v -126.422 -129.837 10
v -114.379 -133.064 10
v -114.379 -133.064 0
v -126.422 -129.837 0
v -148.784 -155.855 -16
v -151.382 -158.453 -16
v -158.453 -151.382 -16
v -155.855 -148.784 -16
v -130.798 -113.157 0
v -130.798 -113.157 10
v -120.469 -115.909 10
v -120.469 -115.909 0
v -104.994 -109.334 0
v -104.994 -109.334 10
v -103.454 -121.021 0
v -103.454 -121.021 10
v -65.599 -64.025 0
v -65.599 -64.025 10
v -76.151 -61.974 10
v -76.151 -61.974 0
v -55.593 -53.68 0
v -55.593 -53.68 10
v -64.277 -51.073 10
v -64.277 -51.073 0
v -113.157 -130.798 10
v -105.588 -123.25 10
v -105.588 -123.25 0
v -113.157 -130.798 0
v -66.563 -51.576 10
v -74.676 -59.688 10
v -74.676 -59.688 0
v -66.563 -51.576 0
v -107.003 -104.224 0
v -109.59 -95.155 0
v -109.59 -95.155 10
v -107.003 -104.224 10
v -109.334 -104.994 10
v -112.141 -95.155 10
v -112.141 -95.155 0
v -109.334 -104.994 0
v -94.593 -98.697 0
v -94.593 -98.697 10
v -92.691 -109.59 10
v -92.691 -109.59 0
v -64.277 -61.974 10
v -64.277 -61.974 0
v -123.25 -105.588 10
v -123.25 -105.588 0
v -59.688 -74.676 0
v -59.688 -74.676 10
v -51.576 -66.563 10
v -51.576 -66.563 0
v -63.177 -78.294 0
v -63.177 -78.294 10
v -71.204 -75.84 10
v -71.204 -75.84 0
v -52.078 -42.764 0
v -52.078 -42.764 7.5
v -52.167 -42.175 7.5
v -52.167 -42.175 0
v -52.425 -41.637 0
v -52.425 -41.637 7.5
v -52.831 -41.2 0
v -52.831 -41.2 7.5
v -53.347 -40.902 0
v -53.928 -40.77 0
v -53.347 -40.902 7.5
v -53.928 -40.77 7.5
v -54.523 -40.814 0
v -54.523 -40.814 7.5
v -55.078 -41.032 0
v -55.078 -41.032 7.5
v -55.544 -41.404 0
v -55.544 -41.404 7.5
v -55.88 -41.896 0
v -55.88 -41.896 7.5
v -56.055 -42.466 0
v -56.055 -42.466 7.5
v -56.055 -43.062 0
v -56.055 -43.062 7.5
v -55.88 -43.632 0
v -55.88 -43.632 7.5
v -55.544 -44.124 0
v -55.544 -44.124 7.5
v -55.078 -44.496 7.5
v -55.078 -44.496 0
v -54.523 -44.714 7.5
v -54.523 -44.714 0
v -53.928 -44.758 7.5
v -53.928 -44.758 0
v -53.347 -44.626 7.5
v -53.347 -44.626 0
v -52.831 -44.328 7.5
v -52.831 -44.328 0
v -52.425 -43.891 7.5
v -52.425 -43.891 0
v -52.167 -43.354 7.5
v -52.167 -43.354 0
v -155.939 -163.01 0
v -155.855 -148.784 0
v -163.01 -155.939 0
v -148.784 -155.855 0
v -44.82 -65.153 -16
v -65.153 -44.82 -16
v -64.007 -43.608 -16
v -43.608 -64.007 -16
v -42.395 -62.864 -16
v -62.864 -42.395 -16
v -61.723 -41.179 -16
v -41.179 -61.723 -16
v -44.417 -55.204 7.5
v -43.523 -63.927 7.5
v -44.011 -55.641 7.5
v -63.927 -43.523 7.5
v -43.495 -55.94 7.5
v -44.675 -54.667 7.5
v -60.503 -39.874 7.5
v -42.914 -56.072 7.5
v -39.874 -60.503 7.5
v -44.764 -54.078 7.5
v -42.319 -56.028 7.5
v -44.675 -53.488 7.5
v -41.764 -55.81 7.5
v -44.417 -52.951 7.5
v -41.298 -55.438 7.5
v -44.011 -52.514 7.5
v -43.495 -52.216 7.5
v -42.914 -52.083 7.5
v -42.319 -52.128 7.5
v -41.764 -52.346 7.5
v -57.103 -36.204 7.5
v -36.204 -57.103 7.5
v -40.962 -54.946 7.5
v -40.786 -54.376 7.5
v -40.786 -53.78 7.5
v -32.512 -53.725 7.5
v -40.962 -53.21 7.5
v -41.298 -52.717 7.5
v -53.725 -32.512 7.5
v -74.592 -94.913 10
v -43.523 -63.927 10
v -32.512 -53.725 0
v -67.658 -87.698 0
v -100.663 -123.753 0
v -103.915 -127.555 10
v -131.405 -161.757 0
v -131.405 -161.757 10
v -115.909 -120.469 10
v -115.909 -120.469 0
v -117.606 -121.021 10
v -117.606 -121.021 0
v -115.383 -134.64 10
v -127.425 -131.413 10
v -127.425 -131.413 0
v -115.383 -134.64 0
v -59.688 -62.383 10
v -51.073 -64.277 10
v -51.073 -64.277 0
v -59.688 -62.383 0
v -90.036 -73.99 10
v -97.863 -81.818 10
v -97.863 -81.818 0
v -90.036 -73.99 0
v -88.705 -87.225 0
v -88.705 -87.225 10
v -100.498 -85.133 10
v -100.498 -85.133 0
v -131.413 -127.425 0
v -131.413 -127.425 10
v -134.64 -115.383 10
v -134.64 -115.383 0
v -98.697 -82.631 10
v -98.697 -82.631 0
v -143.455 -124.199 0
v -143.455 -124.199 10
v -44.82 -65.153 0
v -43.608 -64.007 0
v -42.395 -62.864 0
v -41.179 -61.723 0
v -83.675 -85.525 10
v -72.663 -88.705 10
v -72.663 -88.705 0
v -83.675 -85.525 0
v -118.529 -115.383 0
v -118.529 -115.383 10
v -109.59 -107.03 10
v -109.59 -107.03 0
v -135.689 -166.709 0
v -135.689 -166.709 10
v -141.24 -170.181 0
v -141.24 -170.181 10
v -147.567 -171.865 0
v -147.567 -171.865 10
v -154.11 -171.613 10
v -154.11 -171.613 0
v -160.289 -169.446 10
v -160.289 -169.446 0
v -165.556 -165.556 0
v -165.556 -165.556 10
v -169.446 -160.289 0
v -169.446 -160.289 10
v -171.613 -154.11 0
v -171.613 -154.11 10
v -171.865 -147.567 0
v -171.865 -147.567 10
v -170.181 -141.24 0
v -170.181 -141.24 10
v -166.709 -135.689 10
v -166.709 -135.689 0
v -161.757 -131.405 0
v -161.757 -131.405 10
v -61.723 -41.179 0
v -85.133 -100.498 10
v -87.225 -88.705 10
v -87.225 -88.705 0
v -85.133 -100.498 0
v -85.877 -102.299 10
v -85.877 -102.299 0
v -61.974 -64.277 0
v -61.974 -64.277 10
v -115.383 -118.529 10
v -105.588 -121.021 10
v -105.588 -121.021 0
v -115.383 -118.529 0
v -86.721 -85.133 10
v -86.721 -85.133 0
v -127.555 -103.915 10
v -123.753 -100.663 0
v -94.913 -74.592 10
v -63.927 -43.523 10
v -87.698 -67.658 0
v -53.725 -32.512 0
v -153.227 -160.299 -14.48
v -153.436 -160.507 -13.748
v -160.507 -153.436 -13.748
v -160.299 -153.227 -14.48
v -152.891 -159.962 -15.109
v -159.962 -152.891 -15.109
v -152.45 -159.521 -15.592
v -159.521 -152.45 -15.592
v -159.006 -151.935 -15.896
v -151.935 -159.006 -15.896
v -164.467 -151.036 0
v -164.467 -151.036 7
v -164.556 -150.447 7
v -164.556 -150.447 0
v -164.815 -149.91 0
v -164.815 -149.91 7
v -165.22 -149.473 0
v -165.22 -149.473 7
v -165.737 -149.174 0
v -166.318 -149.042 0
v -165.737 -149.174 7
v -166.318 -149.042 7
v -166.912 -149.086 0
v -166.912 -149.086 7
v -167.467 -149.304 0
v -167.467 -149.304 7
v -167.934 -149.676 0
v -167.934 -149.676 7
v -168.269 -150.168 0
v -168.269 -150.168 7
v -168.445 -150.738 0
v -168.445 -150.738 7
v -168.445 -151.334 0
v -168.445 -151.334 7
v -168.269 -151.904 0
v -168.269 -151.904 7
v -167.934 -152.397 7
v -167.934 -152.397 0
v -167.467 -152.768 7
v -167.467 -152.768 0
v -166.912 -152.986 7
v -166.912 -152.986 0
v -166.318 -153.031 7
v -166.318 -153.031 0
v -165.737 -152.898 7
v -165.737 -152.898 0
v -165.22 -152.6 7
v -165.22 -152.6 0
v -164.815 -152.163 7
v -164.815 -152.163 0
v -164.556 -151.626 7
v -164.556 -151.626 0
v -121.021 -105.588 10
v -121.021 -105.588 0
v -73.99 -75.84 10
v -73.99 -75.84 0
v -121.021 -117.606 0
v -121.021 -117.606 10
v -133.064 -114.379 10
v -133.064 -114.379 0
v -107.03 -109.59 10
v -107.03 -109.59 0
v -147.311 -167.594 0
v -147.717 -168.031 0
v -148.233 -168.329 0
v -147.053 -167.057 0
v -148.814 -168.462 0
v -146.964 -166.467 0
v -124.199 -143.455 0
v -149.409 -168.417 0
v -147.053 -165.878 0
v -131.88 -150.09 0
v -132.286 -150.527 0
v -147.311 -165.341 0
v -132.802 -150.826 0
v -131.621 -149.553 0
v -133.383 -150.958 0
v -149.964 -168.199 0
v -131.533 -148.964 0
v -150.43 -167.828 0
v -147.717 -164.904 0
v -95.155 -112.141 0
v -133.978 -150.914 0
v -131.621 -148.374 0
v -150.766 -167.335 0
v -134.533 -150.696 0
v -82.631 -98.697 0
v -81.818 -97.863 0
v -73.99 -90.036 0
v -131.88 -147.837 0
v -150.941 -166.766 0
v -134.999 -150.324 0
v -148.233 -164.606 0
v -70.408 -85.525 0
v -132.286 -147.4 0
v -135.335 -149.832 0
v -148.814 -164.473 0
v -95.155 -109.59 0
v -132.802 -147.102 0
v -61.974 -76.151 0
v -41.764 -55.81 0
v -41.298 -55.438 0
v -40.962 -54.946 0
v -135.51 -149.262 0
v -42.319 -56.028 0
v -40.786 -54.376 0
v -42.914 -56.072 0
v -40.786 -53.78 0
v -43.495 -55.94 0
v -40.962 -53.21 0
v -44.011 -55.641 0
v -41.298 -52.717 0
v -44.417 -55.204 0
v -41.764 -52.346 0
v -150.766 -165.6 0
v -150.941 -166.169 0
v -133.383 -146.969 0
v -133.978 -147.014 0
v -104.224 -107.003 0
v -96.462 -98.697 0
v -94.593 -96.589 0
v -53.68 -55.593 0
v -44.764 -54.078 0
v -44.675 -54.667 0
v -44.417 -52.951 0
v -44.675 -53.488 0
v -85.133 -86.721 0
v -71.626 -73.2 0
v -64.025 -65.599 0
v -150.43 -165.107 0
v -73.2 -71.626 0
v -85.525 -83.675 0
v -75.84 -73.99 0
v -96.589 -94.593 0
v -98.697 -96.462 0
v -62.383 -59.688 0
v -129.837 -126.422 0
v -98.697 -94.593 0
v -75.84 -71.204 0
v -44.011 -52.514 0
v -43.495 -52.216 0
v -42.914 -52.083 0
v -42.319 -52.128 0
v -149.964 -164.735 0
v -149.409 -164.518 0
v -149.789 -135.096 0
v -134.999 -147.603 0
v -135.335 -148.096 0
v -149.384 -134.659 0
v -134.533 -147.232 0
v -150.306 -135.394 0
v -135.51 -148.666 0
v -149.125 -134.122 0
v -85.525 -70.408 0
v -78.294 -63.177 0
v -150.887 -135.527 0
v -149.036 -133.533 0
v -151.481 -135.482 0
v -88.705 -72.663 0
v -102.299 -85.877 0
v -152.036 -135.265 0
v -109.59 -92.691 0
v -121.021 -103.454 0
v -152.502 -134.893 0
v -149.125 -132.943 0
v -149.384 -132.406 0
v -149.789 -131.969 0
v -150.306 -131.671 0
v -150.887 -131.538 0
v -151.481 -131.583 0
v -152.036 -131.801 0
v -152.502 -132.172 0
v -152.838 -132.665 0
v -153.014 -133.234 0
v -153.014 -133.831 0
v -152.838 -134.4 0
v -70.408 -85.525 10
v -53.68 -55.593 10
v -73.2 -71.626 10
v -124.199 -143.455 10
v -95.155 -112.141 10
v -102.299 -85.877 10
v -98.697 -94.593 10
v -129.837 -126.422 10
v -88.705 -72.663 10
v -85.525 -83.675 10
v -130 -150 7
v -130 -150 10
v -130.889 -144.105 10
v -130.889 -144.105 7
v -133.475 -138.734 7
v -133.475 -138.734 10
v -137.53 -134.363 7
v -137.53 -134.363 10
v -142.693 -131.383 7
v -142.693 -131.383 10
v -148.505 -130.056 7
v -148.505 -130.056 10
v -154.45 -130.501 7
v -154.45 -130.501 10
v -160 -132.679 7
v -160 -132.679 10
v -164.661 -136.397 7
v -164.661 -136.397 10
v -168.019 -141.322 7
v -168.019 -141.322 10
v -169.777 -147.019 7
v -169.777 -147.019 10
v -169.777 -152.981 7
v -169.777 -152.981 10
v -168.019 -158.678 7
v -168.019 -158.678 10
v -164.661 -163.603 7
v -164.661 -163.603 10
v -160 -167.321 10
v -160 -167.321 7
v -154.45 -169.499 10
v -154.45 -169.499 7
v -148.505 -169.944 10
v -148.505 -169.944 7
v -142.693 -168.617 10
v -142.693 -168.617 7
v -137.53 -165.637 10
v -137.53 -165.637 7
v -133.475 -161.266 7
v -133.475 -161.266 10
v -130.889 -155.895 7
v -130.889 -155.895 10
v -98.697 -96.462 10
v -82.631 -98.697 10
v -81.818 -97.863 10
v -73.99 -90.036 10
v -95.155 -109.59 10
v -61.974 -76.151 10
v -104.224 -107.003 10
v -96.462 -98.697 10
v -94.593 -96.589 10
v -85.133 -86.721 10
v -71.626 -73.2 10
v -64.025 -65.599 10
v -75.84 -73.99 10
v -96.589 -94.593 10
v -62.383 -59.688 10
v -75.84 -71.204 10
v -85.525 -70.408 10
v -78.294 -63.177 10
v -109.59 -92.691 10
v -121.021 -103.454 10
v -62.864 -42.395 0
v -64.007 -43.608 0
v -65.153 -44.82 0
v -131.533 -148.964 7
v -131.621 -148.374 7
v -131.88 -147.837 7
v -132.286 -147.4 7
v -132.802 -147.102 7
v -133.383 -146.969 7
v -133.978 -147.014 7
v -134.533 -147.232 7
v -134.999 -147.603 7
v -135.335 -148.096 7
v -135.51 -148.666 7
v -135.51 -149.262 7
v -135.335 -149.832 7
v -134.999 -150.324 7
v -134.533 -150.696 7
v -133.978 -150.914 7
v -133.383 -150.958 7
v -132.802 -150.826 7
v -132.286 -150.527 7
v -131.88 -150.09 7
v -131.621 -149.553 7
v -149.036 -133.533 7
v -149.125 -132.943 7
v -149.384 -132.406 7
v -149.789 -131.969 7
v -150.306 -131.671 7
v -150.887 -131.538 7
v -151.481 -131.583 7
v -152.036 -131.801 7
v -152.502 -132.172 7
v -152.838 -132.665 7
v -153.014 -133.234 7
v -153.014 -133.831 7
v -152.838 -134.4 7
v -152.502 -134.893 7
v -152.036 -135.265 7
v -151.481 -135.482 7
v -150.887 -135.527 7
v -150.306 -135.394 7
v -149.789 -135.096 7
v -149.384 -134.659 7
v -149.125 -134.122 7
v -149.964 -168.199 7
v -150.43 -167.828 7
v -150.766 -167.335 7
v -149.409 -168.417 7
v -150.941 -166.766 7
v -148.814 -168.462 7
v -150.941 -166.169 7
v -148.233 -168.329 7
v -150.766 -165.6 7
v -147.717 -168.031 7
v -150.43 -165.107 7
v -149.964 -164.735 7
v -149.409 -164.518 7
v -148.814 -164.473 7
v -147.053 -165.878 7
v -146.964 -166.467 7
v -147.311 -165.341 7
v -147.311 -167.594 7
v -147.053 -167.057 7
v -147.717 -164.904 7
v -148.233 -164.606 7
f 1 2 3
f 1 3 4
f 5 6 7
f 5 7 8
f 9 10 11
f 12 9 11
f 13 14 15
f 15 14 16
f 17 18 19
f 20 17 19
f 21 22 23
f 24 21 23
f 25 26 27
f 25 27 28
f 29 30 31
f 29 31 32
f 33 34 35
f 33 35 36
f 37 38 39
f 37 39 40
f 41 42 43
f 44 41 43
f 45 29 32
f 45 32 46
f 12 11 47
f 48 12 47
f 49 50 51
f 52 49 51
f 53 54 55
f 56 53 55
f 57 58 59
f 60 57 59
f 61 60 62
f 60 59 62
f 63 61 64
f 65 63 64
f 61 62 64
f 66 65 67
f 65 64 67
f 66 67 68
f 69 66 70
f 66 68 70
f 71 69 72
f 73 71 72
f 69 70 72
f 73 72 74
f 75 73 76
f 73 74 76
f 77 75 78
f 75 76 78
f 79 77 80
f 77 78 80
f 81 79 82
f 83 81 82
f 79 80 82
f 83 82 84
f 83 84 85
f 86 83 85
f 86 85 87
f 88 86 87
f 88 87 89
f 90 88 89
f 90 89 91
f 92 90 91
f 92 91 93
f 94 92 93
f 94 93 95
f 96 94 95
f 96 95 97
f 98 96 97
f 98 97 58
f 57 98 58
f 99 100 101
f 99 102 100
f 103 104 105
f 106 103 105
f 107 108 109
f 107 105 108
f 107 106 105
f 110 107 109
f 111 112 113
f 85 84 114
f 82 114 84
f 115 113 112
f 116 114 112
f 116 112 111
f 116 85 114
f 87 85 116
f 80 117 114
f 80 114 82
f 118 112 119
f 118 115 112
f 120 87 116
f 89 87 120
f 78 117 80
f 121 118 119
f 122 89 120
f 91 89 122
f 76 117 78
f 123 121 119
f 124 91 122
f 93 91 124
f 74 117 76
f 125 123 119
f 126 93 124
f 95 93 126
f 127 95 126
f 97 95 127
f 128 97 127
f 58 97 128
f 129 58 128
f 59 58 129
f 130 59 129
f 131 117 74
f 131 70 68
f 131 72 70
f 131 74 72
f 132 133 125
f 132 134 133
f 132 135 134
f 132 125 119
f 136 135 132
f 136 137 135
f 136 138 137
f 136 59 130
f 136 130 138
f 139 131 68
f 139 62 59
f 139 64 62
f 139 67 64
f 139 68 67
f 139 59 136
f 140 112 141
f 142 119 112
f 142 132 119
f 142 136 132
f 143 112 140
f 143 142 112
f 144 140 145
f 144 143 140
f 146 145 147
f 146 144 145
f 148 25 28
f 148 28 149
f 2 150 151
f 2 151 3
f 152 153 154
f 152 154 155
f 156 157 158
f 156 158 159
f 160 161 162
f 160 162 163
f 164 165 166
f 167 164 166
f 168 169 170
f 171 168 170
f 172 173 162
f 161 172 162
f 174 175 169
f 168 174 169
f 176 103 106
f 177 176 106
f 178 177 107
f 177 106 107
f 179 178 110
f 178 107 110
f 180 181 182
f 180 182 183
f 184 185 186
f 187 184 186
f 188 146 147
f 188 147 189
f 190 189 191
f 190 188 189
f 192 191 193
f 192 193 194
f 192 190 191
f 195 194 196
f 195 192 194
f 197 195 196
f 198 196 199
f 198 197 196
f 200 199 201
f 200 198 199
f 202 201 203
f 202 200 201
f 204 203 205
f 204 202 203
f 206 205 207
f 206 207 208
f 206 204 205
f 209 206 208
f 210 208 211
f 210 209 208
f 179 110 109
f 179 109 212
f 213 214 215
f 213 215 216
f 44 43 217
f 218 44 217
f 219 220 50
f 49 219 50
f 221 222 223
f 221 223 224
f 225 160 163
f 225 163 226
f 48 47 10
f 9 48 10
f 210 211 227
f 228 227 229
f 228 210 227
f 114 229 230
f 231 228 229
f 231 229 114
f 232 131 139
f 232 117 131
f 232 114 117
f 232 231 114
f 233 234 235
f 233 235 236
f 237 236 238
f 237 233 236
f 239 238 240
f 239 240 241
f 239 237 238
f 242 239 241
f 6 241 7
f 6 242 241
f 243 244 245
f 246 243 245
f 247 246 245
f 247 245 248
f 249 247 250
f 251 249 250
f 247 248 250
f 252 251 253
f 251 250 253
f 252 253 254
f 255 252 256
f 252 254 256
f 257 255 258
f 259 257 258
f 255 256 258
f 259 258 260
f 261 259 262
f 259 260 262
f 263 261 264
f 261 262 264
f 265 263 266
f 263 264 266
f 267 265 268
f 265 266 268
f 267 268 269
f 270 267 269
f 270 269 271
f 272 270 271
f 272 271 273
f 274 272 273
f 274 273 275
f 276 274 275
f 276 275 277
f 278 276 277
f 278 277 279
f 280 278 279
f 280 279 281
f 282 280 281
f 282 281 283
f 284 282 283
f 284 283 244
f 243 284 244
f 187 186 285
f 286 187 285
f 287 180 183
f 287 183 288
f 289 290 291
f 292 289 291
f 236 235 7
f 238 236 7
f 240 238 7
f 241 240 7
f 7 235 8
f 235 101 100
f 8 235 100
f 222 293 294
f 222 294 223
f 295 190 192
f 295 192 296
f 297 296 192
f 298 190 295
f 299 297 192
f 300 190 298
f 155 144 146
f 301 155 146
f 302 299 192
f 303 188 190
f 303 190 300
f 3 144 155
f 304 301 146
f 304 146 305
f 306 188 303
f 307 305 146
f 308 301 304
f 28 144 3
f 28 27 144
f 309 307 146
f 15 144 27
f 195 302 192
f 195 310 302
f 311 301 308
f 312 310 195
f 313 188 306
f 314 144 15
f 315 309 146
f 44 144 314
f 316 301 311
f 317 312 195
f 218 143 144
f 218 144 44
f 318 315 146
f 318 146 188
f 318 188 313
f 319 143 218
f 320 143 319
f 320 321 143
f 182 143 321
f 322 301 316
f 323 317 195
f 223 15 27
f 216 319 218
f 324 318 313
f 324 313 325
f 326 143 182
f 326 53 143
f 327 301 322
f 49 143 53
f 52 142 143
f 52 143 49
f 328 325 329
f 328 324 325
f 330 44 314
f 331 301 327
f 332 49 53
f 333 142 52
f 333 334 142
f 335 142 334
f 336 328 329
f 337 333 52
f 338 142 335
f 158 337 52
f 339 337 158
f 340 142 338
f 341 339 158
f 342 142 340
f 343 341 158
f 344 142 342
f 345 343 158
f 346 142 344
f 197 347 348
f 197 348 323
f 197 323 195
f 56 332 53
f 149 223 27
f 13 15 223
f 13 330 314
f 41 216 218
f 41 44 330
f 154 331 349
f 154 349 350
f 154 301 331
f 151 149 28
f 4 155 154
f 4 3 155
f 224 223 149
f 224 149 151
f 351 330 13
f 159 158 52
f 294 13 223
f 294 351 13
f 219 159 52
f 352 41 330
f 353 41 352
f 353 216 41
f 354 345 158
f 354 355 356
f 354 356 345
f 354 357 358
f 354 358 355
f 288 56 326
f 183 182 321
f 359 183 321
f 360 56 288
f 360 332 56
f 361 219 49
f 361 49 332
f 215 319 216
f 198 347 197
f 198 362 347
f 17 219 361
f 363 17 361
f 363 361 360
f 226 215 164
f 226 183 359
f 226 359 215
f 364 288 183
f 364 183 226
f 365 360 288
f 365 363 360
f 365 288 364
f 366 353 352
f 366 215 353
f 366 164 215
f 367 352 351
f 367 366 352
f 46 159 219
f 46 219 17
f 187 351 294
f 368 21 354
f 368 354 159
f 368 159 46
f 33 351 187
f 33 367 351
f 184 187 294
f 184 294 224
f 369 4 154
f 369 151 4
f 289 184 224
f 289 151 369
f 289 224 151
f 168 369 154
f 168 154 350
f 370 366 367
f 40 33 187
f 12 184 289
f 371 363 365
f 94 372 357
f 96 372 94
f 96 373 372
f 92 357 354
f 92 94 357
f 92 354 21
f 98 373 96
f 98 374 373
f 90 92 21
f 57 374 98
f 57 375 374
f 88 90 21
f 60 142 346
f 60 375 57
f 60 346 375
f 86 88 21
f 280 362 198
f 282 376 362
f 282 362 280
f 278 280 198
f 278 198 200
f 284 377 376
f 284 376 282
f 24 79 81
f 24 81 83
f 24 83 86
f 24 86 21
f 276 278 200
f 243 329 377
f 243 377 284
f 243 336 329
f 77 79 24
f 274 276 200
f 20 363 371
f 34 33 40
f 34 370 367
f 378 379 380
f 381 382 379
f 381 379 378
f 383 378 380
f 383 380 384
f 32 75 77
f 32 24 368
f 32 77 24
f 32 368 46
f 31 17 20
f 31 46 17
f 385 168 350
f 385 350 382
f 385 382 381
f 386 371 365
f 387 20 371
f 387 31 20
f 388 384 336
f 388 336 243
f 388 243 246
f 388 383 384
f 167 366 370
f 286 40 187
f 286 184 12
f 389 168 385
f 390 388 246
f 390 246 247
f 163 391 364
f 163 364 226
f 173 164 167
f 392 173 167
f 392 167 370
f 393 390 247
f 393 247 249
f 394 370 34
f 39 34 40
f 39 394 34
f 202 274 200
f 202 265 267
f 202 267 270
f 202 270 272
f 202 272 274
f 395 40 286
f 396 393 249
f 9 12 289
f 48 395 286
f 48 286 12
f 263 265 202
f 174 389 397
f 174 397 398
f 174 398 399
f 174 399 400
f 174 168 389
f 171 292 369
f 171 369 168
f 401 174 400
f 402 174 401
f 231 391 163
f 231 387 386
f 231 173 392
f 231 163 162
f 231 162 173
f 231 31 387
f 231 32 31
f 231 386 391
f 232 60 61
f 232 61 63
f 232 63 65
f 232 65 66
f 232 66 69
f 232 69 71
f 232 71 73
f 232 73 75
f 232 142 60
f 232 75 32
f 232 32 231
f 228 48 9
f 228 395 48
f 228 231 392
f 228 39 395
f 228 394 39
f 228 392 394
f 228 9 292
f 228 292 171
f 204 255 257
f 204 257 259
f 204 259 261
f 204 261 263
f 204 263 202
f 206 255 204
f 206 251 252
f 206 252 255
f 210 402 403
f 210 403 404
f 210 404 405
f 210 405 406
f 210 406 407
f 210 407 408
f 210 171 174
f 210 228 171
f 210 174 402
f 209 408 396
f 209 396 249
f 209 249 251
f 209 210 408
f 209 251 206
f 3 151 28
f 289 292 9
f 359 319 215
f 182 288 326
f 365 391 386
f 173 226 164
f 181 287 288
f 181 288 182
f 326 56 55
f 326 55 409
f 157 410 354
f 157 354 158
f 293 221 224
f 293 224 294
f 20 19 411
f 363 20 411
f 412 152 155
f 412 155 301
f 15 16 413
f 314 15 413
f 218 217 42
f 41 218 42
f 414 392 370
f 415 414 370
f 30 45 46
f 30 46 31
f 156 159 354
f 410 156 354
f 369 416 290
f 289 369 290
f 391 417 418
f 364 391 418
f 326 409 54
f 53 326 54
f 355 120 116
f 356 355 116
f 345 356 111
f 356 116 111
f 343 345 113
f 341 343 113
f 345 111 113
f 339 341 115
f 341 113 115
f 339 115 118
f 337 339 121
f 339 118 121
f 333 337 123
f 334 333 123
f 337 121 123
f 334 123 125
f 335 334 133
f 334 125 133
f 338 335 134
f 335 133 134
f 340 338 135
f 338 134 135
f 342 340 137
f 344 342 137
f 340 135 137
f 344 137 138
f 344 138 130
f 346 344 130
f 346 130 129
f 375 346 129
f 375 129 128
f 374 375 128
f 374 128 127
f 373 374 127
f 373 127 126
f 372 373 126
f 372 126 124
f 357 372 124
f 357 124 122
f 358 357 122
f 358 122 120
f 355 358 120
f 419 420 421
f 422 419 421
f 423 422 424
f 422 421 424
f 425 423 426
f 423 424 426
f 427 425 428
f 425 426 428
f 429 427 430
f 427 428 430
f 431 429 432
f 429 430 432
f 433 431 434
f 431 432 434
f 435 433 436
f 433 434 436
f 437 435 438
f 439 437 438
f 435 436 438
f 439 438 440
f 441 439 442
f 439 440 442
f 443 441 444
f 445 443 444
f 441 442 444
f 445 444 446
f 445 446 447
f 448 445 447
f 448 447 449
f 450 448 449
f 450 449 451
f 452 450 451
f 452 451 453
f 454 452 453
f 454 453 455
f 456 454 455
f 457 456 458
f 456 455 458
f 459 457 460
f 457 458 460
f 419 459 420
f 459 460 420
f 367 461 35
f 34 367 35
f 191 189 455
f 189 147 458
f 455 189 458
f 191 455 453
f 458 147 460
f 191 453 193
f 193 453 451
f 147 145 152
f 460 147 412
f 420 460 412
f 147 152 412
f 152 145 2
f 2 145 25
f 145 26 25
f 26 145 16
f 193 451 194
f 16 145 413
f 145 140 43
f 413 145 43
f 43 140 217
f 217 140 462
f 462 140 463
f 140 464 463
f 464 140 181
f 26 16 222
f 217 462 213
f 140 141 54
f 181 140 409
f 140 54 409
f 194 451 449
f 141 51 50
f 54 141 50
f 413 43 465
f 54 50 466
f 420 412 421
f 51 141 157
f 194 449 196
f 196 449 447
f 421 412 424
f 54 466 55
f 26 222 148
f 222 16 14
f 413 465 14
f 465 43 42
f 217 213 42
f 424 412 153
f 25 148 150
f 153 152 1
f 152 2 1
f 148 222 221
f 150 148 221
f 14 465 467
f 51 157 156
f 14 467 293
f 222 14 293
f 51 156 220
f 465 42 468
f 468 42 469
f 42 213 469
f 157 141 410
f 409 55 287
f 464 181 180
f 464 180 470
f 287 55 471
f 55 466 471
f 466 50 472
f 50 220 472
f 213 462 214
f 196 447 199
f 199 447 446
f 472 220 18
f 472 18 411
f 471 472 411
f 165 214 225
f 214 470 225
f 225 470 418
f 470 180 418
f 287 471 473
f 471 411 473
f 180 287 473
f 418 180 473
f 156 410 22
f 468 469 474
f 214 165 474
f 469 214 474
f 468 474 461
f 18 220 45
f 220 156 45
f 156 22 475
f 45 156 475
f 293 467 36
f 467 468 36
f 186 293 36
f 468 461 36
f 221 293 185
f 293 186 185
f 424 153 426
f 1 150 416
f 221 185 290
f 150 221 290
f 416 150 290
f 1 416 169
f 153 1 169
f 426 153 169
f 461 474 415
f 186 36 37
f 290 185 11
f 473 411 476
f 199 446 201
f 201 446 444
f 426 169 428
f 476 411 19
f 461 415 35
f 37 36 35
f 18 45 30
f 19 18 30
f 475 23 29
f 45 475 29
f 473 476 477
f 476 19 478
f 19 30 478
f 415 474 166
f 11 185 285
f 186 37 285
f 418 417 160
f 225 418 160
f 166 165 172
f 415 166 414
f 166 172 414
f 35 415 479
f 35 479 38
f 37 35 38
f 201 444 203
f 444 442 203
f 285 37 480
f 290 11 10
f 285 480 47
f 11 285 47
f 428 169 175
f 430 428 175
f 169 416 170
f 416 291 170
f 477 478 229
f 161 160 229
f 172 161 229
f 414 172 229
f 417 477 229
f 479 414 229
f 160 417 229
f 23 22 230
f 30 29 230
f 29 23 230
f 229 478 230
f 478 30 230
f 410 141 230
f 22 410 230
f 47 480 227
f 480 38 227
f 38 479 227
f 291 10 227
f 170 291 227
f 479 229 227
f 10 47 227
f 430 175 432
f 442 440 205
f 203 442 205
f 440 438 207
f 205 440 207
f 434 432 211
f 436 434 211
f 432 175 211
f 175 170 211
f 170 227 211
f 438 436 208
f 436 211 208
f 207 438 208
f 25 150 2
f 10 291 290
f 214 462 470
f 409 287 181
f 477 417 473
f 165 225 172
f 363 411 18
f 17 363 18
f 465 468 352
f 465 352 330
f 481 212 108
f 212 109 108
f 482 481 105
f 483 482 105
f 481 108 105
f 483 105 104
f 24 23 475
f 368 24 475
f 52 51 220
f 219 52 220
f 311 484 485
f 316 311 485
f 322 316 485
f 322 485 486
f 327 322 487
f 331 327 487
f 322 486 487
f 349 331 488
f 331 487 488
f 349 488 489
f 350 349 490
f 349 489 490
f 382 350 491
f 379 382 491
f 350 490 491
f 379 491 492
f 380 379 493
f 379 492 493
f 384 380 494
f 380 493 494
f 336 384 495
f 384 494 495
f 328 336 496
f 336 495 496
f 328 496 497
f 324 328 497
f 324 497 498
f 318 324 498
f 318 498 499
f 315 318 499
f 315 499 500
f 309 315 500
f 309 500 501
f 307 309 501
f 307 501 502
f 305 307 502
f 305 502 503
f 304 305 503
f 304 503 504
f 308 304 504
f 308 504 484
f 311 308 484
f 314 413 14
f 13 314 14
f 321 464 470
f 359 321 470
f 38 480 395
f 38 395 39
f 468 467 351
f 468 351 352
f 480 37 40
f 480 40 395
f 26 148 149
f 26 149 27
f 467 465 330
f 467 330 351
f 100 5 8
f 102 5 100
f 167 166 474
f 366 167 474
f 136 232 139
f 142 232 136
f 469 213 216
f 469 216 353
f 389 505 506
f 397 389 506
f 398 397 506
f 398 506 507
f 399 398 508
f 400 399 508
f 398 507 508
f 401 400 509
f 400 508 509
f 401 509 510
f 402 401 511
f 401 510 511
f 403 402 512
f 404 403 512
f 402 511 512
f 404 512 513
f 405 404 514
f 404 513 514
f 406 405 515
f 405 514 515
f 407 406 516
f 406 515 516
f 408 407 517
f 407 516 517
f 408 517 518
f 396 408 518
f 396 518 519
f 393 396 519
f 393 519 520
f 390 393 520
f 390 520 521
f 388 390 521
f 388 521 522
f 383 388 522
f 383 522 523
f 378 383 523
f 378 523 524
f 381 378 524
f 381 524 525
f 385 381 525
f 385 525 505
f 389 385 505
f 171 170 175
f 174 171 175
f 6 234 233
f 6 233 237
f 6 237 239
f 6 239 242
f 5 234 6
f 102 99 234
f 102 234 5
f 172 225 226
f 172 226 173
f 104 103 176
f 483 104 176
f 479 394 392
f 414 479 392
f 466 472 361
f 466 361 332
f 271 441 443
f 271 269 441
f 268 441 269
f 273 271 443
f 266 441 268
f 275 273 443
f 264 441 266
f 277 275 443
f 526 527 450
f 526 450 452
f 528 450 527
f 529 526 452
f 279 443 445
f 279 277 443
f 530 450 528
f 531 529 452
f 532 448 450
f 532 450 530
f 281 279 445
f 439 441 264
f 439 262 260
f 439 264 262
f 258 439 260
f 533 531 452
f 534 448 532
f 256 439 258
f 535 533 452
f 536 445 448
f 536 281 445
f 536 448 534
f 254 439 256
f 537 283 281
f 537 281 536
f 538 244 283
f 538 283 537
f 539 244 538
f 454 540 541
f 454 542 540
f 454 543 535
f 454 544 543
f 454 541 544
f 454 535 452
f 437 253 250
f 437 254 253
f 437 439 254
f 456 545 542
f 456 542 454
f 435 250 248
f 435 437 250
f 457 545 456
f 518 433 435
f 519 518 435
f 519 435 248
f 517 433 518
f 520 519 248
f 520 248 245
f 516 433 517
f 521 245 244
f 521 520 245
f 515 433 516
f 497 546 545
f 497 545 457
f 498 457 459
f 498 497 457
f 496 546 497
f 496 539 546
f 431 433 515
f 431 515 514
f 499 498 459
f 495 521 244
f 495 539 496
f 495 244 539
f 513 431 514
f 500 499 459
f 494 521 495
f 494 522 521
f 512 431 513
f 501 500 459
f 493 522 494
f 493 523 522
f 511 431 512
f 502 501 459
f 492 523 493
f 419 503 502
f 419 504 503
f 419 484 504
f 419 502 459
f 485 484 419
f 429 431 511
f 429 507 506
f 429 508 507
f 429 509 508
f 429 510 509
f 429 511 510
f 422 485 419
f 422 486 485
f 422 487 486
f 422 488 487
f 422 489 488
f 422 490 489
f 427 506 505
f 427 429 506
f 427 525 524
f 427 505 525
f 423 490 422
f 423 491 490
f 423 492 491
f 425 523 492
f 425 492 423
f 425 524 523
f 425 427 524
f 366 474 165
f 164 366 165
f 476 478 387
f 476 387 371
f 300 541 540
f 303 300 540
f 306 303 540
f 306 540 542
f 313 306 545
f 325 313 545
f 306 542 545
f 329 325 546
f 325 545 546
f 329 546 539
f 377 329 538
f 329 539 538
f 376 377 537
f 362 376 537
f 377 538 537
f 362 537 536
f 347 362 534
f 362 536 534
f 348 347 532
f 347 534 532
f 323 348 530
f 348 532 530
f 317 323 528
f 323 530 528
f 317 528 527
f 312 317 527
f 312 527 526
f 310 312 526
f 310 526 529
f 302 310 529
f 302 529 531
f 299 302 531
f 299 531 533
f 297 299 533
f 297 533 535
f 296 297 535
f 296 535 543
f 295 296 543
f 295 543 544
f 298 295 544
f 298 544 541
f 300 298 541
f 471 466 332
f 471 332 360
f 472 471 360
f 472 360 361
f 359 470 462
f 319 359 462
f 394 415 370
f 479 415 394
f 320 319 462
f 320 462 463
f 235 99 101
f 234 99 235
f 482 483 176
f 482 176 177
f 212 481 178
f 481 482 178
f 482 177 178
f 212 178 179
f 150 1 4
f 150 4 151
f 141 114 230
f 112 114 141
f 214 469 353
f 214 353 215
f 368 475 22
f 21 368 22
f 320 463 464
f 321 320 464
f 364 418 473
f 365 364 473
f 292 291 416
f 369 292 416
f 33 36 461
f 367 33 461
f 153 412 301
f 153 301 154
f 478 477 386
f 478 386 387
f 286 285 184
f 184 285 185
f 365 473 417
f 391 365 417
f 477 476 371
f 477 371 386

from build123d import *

# Parameters (mm, degrees)
BOSS_EXTRUDE1_DEPTH                  = 10
BOSS_EXTRUDE2_DEPTH                  = 5
SKETCH5_R                            = 20
CUT_EXTRUDE1_DEPTH                   = 3
SKETCH7_R                            = 2
CUT_EXTRUDE2_DEPTH                   = 245.329695289
CUT_EXTRUDE3_START                   = -2.5
CUT_EXTRUDE3_DEPTH                   = 2.5
SKETCH9_R                            = 2
CUT_EXTRUDE4_DEPTH                   = 245.37726981
BOSS_EXTRUDE3_REACH                  = 245.77
BOSS_EXTRUDE3_END_RADIUS             = 800
SKETCH10_W                           = 5
SKETCH10_H                           = 16
BOSS_EXTRUDE3_DIRECTION_2_REACH      = 245.77
BOSS_EXTRUDE3_DIRECTION_2_END_RADIUS = 800
CUT_EXTRUDE5_DEPTH                   = 245.63033336


with BuildPart() as part:
    # Sketch1 → Boss-Extrude1 (new body)
    with BuildSketch(Plane.XY):
        with BuildLine():
            Line((-53.725181106, -32.51197767), (-32.51197767, -53.725181106))
            ThreePointArc((-32.51197767, -53.725181106), (-84.43584578, -105.473072704), (-131.4048367, -161.756696044))
            ThreePointArc((-131.4048367, -161.756696044), (-165.556349186, -165.556349186), (-161.756696044, -131.4048367))
            ThreePointArc((-161.756696044, -131.4048367), (-105.473072704, -84.43584578), (-53.725181106, -32.51197767))
        make_face()
    extrude(amount=BOSS_EXTRUDE1_DEPTH)

    # Sketch5 → Cut-Extrude1 (cut)
    with BuildSketch(Plane.XY.offset(10)):
        with Locations((-150, -150)):
            Circle(SKETCH5_R)
    extrude(amount=-CUT_EXTRUDE1_DEPTH, mode=Mode.SUBTRACT)

    # Sketch7 → Cut-Extrude2 (cut, through all)
    with BuildSketch(Plane.XY.offset(7)):
        with Locations((-166.467430068, -151.036217613)):
            Circle(SKETCH7_R)
        with Locations((-151.036217613, -133.532569932)):
            Circle(SKETCH7_R)
        with Locations((-133.532569932, -148.963782387)):
            Circle(SKETCH7_R)
        with Locations((-148.963782387, -166.467430068)):
            Circle(SKETCH7_R)
    extrude(amount=-CUT_EXTRUDE2_DEPTH, mode=Mode.SUBTRACT)

    # Sketch8 → Cut-Extrude3 (cut)
    with BuildSketch(Plane.XY.offset(10).offset(CUT_EXTRUDE3_START)):
        with BuildLine():
            ThreePointArc((-53.725181106, -32.51197767), (-58.800243607, -38.041617861), (-63.926960875, -43.523401337))
            Line((-63.926960875, -43.523401337), (-43.523401337, -63.926960875))
            ThreePointArc((-43.523401337, -63.926960875), (-38.041617861, -58.800243607), (-32.51197767, -53.725181106))
            Line((-32.51197767, -53.725181106), (-53.725181106, -32.51197767))
        make_face()
    extrude(amount=CUT_EXTRUDE3_DEPTH, mode=Mode.SUBTRACT)

    # Sketch9 → Cut-Extrude4 (cut, through all)
    with BuildSketch(Plane.XY.offset(7.5)):
        with Locations((-54.077784983, -42.764076484)):
            Circle(SKETCH9_R)
        with Locations((-42.764076484, -54.077784983)):
            Circle(SKETCH9_R)
    extrude(amount=-CUT_EXTRUDE4_DEPTH, mode=Mode.SUBTRACT)

    # Sketch11 → Cut-Extrude5 (cut, through all)
    with BuildSketch(Plane.XY.offset(10)):
        Polygon((-133.063682372, -114.379119695), (-129.836922908, -126.421549962), (-121.021252106, -117.60587916), align=None)
        Polygon((-131.412745558, -127.425424466), (-134.639505023, -115.382994199), (-143.455175824, -124.198665001), align=None)
        Polygon((-121.021252106, -105.588274341), (-118.529065809, -115.382994199), (-109.590217466, -107.029504625), align=None)
        Polygon((-123.24979044, -105.588274341), (-130.797680236, -113.156969968), (-120.469052652, -115.909286462), align=None)
        Polygon((-121.021252106, -103.453965288), (-112.140585737, -95.154847651), (-109.333620391, -104.994319762), align=None)
        Polygon((-109.590217466, -95.154847651), (-107.00296521, -104.224142525), (-98.697266452, -96.462340856), align=None)
        Polygon((-109.590217466, -92.690573255), (-102.298737686, -85.876574628), (-98.697266452, -94.592518287), align=None)
        Polygon((-97.863320396, -81.81794377), (-90.035599808, -73.990223182), (-86.721041856, -85.132501722), (-98.697266452, -82.630998805), align=None)
        Polygon((-100.498002069, -85.132501722), (-96.589076212, -94.592518287), (-88.705275198, -87.224986468), align=None)
        Polygon((-88.705275198, -72.663490879), (-85.524709977, -83.675368995), (-75.839564165, -73.990223182), align=None)
        Polygon((-85.524709977, -70.408045964), (-78.294018925, -63.177354912), (-75.839564165, -71.204085345), align=None)
        Polygon((-76.151448432, -61.974425213), (-73.200251229, -71.625637689), (-65.599114287, -64.024500748), align=None)
        Polygon((-74.67584983, -59.688369594), (-66.56343802, -51.575957784), (-64.277382401, -61.974425213), align=None)
        Polygon((-64.277382401, -51.073378886), (-62.383416002, -59.688369594), (-55.593175908, -53.679881002), align=None)
    cut_extrude5 = extrude(amount=-CUT_EXTRUDE5_DEPTH, mode=Mode.SUBTRACT)

    # Mirror1: Cut-Extrude5 across plane
    add(cut_extrude5.mirror(Plane(origin=(0, 0, 0), x_dir=(0, 0, 1), z_dir=(-0.7071067811865469, 0.7071067811865481, 0))), mode=Mode.SUBTRACT)


with BuildPart() as body_2:
    # Sketch4 → Boss-Extrude2 (new, symmetric)
    with BuildSketch(Plane(origin=(0, 0, 0), x_dir=(0.7071067811865481, 0.7071067811865469, 0), z_dir=(0.7071067811865469, -0.7071067811865481, 0))):
        with BuildLine():
            Line((-225.531437003, 0), (-221.991852446, -13.747992553))
            ThreePointArc((-221.991852446, -13.747992553), (-220.924534017, -15.37107335), (-219.086597356, -16))
            Line((-219.086597356, -16), (-215.412046286, -16))
            Line((-215.412046286, -16), (-215.412046286, 0))
            Line((-215.412046286, 0), (-225.531437003, 0))
        make_face()
    extrude(amount=BOSS_EXTRUDE2_DEPTH, both=True)


with BuildPart() as body_3:
    # Boss-Extrude3: up to this cylinder (the profile starts outside it)
    boss_extrude3_end = Plane(origin=(505.657439071, -645.648891464, -8), z_dir=(0, 0, -1)) * Cylinder(BOSS_EXTRUDE3_END_RADIUS, 2092.54, mode=Mode.PRIVATE)
    # Sketch10 → Boss-Extrude3 (new, up to the surface)
    with BuildSketch(Plane(origin=(0, 0, 0), x_dir=(0.7071067811865481, 0.7071067811865469, 0), z_dir=(0.7071067811865469, -0.7071067811865481, 0)), mode=Mode.PRIVATE) as boss_extrude3_sk1:
        with Locations((-75.26259993, -8)):
            Rectangle(SKETCH10_W, SKETCH10_H)
    boss_extrude3_tool1 = extrude(boss_extrude3_sk1.sketch, amount=BOSS_EXTRUDE3_REACH, mode=Mode.PRIVATE) - boss_extrude3_end
    add(boss_extrude3_tool1.solids().sort_by_distance((-53.218695, -53.218695, -8))[0])

    # Boss-Extrude3 direction 2: up to this cylinder (the profile starts outside it)
    boss_extrude3_direction_2_end = Plane(origin=(-645.648891464, 505.657439071, -8), z_dir=(0, 0, -1)) * Cylinder(BOSS_EXTRUDE3_DIRECTION_2_END_RADIUS, 2092.54, mode=Mode.PRIVATE)
    # Sketch10 → Boss-Extrude3 direction 2 (add, up to the surface)
    with BuildSketch(Plane(origin=(0, 0, 0), x_dir=(0.7071067811865481, 0.7071067811865469, 0), z_dir=(0.7071067811865469, -0.7071067811865481, 0)), mode=Mode.PRIVATE) as boss_extrude3_direction_2_sk1:
        with Locations((-75.26259993, -8)):
            Rectangle(SKETCH10_W, SKETCH10_H)
    boss_extrude3_direction_2_tool1 = extrude(boss_extrude3_direction_2_sk1.sketch, amount=-BOSS_EXTRUDE3_DIRECTION_2_REACH, mode=Mode.PRIVATE) - boss_extrude3_direction_2_end
    add(boss_extrude3_direction_2_tool1.solids().sort_by_distance((-53.218695, -53.218695, -8))[0])


solid = Compound([part.part, body_2.part, body_3.part])
